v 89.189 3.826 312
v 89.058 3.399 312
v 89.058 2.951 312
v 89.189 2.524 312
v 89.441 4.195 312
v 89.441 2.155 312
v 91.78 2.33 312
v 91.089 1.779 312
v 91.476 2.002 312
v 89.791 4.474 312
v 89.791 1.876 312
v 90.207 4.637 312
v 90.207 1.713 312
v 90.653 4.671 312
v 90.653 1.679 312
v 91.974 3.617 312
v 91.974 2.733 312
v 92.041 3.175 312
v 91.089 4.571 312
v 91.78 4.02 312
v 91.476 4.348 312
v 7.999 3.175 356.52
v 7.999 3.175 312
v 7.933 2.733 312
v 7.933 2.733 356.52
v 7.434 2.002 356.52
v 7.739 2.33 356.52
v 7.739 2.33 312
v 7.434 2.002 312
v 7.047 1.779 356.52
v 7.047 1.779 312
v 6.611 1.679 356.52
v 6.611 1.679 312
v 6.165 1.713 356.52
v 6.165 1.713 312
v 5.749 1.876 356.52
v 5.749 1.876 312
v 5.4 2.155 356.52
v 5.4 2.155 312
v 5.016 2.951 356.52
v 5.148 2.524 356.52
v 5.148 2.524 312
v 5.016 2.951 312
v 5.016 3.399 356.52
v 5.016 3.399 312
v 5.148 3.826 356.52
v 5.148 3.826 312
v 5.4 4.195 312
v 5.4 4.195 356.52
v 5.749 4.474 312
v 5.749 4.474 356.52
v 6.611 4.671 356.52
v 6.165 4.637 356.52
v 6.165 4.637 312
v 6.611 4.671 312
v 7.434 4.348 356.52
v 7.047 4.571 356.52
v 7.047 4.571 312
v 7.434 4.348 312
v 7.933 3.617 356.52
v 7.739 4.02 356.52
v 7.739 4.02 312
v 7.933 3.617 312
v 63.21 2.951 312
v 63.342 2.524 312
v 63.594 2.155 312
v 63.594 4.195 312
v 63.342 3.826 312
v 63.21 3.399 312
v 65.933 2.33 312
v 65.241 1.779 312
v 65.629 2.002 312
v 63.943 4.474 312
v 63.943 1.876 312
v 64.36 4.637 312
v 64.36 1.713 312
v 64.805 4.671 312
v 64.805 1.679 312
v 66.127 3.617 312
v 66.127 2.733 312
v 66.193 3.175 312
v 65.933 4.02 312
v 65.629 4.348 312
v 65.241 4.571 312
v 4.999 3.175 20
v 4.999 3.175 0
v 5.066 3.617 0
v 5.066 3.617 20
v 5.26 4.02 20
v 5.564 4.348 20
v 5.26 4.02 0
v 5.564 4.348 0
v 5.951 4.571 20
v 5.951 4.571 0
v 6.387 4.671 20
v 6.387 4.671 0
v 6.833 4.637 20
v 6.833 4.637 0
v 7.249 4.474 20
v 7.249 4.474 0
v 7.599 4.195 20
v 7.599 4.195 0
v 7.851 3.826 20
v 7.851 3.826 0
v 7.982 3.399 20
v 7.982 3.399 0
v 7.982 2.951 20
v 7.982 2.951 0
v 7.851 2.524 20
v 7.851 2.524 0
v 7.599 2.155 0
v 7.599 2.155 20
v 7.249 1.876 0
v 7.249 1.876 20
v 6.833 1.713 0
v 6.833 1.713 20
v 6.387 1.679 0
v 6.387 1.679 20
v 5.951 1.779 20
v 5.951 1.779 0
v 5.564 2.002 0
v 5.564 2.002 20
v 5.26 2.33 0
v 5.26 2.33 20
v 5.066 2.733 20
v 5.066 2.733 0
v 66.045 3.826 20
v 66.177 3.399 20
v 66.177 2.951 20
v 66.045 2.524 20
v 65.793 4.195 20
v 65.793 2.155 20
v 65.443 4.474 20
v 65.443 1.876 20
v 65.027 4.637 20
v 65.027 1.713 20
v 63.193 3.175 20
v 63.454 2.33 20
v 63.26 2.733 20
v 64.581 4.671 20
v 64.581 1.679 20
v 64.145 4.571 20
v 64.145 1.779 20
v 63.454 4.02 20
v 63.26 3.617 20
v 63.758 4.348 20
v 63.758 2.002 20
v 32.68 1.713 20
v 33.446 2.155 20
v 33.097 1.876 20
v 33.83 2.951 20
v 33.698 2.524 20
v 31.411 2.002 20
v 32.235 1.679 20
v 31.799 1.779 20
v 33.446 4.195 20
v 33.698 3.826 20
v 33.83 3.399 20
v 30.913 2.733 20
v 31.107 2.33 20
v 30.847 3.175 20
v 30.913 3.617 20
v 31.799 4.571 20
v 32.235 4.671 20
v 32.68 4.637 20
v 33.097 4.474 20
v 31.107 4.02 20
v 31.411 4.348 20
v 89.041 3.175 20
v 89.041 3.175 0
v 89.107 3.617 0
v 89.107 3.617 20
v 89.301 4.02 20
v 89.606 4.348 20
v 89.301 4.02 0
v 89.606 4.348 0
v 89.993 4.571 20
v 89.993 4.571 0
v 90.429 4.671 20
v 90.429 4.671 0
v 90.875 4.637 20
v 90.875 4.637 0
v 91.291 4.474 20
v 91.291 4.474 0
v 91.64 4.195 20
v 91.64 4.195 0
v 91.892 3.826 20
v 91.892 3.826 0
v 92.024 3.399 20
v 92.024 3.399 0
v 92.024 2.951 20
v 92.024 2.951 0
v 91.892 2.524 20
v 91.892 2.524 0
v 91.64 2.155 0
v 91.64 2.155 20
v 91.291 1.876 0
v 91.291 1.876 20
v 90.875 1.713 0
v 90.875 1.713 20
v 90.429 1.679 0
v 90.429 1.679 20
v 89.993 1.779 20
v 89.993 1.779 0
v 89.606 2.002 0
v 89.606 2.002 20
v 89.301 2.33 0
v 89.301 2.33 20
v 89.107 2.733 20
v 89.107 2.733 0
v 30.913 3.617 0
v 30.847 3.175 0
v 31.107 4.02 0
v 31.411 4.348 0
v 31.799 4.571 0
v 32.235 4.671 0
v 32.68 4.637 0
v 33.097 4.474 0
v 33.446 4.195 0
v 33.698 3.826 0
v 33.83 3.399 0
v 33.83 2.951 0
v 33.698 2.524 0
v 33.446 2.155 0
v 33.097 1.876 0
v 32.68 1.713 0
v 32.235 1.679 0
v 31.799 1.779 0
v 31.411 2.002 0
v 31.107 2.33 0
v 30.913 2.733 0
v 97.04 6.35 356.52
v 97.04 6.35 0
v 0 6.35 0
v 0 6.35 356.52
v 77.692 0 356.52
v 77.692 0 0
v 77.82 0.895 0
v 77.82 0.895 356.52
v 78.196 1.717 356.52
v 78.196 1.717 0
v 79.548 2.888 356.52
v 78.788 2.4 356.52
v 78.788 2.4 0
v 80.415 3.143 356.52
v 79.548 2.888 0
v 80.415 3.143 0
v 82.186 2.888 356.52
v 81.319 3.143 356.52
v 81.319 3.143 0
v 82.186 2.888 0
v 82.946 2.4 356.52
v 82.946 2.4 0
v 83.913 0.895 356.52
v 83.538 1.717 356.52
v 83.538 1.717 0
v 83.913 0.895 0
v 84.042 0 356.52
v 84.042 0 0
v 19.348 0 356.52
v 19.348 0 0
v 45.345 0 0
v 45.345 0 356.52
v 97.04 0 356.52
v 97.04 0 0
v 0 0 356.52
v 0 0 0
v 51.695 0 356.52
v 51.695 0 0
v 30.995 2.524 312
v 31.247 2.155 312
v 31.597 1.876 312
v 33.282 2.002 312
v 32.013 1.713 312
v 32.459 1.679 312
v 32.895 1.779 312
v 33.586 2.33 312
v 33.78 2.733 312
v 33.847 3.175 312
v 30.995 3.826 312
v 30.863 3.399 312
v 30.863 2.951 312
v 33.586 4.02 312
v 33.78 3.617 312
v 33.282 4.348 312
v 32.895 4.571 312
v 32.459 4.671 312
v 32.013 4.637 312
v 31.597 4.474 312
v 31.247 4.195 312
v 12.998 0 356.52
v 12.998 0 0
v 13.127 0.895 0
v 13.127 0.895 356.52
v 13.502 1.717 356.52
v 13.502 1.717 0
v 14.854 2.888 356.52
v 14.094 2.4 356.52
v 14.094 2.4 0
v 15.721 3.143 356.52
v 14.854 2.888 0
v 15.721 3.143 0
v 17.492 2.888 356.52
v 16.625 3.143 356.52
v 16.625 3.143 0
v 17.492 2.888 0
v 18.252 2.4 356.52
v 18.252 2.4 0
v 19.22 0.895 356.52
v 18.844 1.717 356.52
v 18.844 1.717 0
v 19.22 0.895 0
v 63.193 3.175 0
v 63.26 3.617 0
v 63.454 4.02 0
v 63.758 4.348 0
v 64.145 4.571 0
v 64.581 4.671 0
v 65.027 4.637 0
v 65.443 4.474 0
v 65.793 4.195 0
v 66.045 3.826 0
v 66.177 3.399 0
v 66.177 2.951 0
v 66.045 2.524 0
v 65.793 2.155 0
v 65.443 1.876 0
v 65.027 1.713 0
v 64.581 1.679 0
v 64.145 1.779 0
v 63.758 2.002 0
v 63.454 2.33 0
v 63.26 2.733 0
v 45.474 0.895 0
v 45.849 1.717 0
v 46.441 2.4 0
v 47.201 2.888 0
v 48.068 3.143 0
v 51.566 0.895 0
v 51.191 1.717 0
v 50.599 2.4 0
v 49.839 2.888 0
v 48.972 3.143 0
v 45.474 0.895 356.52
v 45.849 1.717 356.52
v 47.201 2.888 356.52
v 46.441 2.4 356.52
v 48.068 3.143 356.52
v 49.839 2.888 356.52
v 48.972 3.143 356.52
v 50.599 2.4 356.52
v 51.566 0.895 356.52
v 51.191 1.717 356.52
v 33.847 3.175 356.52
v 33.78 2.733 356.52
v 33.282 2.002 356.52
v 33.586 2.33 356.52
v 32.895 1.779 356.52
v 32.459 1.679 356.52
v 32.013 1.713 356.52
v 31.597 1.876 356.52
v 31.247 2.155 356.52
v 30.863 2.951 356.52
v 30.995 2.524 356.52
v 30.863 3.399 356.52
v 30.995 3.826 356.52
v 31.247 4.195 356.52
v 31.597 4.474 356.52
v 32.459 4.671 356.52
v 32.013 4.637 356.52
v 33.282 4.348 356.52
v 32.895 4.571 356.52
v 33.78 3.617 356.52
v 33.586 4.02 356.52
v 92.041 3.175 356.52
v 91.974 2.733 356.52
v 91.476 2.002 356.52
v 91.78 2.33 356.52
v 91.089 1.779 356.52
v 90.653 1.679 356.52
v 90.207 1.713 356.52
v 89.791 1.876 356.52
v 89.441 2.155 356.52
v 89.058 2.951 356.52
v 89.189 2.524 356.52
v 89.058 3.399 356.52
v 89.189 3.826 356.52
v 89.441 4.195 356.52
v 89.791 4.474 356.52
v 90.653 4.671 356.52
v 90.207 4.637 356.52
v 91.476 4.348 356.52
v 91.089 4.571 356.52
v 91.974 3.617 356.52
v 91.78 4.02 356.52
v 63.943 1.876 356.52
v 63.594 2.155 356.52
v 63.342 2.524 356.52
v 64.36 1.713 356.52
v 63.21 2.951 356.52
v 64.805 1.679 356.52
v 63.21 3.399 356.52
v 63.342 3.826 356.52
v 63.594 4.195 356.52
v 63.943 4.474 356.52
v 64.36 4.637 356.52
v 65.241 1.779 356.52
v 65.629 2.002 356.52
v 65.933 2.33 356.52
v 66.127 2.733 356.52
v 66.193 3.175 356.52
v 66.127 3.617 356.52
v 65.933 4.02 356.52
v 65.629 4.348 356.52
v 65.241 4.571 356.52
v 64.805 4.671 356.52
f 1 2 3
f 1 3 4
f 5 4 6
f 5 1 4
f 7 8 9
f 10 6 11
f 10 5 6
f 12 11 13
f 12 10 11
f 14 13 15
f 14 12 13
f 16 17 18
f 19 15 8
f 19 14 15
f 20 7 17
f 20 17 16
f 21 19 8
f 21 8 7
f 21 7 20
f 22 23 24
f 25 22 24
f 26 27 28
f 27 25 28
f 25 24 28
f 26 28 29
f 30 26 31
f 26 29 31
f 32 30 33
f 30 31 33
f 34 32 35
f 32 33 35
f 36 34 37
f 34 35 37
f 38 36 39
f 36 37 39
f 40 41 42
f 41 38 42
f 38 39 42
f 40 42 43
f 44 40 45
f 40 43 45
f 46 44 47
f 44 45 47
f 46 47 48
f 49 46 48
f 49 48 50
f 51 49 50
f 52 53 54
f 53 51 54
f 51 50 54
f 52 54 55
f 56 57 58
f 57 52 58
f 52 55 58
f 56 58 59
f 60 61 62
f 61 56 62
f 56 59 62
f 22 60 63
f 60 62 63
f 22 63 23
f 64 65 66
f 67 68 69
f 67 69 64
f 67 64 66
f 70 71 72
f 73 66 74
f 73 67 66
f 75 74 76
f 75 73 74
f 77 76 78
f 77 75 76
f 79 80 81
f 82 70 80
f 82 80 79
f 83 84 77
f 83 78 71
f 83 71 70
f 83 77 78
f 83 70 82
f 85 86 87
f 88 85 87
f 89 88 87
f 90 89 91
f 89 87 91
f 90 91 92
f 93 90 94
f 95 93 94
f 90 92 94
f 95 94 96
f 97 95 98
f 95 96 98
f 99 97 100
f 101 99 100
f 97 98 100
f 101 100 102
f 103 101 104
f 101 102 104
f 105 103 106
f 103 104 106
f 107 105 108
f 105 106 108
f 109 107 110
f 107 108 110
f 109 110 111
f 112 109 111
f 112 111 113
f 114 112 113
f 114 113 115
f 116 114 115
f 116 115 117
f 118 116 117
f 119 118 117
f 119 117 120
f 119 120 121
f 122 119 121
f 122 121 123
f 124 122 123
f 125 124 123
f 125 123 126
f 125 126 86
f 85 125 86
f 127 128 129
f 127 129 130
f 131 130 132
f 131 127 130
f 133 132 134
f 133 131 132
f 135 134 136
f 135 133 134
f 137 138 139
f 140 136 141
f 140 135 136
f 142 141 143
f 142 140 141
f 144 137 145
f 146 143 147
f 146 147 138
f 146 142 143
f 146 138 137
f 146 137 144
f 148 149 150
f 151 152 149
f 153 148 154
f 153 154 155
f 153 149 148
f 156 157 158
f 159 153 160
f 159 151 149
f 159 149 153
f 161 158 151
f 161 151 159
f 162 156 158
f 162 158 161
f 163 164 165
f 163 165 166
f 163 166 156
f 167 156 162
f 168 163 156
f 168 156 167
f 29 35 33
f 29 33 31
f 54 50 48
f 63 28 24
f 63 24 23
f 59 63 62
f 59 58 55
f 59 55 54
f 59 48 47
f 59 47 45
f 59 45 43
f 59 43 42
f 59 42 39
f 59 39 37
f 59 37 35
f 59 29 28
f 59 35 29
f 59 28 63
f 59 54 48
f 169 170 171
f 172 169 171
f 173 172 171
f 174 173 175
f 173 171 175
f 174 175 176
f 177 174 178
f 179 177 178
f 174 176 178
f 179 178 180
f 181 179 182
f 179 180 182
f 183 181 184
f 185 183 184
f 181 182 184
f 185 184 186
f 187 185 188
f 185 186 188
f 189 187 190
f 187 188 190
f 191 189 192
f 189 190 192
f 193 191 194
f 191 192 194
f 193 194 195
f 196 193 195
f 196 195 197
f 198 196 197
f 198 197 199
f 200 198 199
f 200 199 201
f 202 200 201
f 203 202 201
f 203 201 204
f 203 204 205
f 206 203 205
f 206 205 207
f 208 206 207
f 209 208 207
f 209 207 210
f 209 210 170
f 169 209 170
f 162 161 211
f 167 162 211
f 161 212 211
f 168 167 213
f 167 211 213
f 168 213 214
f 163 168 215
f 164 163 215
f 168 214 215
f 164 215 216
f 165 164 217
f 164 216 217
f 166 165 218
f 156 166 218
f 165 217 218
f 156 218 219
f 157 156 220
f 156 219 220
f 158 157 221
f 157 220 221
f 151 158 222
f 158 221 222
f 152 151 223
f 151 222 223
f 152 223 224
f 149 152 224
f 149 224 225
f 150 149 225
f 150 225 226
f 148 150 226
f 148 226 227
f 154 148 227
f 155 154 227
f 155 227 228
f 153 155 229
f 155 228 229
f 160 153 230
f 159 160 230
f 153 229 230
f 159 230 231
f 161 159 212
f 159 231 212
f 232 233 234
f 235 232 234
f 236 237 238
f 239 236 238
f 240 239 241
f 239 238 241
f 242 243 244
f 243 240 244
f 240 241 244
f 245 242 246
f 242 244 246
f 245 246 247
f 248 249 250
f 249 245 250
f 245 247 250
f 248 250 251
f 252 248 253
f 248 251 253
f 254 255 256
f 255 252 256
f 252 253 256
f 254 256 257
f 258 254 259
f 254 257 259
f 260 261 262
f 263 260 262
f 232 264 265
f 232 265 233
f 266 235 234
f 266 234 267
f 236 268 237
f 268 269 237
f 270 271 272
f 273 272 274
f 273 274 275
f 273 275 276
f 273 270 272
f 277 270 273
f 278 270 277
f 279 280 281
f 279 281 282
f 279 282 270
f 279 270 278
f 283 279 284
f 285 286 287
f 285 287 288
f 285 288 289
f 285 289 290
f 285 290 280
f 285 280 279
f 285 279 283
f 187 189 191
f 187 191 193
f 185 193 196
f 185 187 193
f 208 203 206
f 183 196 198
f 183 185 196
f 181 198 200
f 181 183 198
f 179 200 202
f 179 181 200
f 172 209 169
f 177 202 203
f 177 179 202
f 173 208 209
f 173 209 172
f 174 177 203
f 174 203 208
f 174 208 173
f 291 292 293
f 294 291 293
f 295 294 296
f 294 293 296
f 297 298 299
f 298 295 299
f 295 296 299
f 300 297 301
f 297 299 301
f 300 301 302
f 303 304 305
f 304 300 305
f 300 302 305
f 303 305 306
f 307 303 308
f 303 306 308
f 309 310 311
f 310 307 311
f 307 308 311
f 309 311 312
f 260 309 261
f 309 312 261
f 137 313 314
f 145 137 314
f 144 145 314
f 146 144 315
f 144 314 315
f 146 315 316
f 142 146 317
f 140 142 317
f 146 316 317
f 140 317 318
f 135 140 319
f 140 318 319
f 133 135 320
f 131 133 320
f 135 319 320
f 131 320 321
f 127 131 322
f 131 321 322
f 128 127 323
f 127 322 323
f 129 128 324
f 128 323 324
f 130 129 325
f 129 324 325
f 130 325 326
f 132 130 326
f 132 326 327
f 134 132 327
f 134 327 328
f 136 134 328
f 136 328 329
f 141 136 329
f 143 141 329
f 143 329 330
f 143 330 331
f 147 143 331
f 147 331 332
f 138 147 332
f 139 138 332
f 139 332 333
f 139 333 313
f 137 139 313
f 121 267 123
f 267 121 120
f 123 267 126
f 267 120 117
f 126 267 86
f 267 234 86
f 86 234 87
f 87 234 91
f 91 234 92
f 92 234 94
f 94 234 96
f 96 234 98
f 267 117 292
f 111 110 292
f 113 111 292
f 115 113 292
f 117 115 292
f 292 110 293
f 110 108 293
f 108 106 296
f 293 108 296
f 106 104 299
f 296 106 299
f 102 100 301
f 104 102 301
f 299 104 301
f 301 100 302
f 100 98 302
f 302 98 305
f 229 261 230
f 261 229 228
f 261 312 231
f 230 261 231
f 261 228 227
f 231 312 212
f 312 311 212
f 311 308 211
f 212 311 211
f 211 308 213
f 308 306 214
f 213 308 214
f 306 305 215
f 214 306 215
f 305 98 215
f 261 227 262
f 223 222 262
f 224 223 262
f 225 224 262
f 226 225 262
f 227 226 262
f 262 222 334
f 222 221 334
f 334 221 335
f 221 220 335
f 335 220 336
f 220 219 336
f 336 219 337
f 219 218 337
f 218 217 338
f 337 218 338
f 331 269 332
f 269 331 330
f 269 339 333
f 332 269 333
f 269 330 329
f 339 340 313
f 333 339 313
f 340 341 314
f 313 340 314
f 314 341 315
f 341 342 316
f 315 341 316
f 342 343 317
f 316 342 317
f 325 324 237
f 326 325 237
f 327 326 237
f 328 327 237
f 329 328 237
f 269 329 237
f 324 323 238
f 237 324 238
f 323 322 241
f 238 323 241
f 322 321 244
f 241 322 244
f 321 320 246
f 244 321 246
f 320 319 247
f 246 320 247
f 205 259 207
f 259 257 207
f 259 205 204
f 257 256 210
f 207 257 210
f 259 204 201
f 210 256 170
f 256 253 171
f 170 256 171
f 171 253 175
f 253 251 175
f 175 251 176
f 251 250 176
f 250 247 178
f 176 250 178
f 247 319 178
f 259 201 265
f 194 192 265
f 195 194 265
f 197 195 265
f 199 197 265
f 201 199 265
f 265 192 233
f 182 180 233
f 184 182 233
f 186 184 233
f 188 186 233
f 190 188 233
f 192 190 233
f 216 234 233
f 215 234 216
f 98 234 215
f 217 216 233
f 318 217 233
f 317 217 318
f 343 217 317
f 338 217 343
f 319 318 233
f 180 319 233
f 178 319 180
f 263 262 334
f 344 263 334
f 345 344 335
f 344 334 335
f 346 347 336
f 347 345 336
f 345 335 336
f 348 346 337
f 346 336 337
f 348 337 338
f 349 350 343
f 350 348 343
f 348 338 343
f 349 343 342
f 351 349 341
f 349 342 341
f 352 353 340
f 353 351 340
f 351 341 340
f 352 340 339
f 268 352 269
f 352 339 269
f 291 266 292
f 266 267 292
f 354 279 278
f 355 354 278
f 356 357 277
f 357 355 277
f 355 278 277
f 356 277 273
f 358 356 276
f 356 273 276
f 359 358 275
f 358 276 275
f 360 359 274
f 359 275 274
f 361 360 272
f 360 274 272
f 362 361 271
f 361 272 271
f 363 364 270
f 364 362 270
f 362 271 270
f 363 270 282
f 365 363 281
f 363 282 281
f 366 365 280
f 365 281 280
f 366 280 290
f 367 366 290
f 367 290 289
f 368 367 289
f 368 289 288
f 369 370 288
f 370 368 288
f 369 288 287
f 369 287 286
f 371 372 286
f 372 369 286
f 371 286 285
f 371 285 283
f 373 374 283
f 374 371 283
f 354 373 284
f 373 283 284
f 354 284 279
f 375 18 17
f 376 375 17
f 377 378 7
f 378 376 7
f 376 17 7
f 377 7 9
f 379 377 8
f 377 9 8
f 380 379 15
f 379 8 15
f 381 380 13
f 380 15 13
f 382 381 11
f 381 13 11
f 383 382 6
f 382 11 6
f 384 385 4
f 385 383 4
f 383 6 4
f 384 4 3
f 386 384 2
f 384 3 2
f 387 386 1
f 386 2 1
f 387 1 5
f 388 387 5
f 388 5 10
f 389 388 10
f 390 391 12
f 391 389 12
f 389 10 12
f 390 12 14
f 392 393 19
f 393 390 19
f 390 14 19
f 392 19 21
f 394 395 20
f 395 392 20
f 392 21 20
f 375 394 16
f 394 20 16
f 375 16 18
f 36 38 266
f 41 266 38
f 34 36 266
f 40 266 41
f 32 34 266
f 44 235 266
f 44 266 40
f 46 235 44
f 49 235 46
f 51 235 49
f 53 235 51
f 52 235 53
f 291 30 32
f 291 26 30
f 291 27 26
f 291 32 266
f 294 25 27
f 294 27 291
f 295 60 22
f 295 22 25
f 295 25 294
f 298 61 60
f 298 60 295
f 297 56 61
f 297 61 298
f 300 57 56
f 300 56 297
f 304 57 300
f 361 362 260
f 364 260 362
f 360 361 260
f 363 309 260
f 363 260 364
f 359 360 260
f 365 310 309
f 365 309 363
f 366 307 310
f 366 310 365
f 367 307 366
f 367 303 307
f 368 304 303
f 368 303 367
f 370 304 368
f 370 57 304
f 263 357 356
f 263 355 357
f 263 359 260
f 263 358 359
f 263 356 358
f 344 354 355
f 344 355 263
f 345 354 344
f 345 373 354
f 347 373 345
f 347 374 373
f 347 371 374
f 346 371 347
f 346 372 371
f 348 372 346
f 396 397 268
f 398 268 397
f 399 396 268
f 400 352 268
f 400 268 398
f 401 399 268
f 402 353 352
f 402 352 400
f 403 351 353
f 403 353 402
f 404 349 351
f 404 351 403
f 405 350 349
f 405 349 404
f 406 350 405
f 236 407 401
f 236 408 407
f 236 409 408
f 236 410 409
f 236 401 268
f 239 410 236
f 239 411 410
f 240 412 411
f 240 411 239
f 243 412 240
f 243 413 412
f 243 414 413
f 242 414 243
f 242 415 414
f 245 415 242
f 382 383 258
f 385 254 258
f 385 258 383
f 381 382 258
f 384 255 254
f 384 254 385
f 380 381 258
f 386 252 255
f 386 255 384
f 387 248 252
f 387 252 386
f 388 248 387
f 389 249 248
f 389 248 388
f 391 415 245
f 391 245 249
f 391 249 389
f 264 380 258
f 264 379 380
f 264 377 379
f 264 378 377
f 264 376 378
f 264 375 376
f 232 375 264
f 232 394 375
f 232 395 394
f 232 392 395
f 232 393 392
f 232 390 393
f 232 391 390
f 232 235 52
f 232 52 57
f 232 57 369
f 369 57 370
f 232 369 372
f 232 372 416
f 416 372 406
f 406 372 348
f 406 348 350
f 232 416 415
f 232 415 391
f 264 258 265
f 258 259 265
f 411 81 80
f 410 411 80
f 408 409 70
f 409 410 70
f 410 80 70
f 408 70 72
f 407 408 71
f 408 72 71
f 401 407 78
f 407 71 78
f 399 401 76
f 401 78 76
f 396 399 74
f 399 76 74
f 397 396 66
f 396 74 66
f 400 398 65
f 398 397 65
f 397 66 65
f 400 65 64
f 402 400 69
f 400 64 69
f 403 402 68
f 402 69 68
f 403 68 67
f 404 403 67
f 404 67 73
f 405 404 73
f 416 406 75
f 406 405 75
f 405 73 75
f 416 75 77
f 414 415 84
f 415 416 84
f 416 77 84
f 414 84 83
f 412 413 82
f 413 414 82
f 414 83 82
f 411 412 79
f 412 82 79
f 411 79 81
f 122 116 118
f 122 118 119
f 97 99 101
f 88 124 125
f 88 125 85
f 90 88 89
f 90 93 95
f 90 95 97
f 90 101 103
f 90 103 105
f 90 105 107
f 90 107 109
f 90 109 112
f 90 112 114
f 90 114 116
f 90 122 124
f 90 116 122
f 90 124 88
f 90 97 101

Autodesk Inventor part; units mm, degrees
ref_plane "YZ Plane" through (0, 0, 0) normal (1, 0, 0) x (0, 1, 0)
ref_plane "XZ Plane" through (0, 0, 0) normal (0, 1, 0) x (-1, 0, 0)
ref_plane "XY Plane" through (0, 0, 0) normal (0, 0, 1) x (1, 0, 0)
sketch "Sketch1" plane through (0, 0, 0) normal (0, 0, 1) x (1, 0, 0)
  line L0 (0, 0) -> (0, 6.35)
  line L1 (0, 6.35) -> (97.04, 6.35)
  line L2 (97.04, 6.35) -> (97.04, 0)
  line L3 (97.04, 0) -> (0, 0)
  dimension "d0" = 6.35
  dimension "d1" = 97.04
extrude "Extrusion1" add sketch "Sketch1" along normal blind 332
sketch "Sketch2" plane through (0, 0, 332) normal (0, 0, 1) x (1, 0, 0)
  line L0 (0, 0) -> (16.1733, 0) construction
  line L1 (16.1733, 0) -> (48.52, 0) construction
  line L2 (48.52, 0) -> (80.8667, 0) construction
  line L3 (0, 0) -> (97.04, 0) projected
  arc A0 (19.3483, 0) -> (12.9983, 0) centre (16.1733, 0) ccw
  arc A1 (51.695, 0) -> (45.345, 0) centre (48.52, 0) ccw
  arc A2 (84.0417, 0) -> (77.6917, 0) centre (80.8667, 0) ccw
  line L4 (12.9983, 0) -> (19.3483, 0)
  line L5 (45.345, 0) -> (51.695, 0)
  line L6 (77.6917, 0) -> (84.0417, 0)
  dimension "d4" = 16.1733
  dimension "d5" = 32.3467
  dimension "d6" = 32.3467
  dimension "d12" = 3.175
  dimension "d13" = 3.175
  dimension "d14" = 3.175
extrude "Extrusion3" cut sketch "Sketch2" against normal through all
sketch "Sketch3" plane through (0, 0, 332) normal (0, 0, 1) x (1, 0, 0)
  arc A0 (19.3483, 0) -> (12.9983, 0) centre (16.1733, 0) ccw projected
  line L0 (0, 0) -> (0, 6.35) construction
  line L1 (0, 0) -> (0, 3.175) construction
  arc A1 (19.3483, 0) -> (12.9983, 0) centre (16.1733, 0) ccw construction
  line L2 (16.1733, 3.175) -> (12.9983, 3.175)
  line L3 (0, 3.175) -> (6.4992, 3.175) construction
  line L4 (45.345, 0) -> (19.3483, 0) construction
  line L5 (19.3483, 0) -> (32.3467, 0) construction
  circle A2 centre (32.3467, 3.175) radius 1.5
  circle A3 centre (6.4992, 3.175) radius 1.5
  line L6 (51.695, 0) -> (64.6933, 0) construction
  line L7 (77.6917, 0) -> (51.695, 0) construction
  circle A4 centre (64.6933, 3.175) radius 1.5
  line L8 (84.0417, 0) -> (90.5408, 0) construction
  line L9 (97.04, 0) -> (84.0417, 0) construction
  circle A5 centre (90.5408, 3.175) radius 1.5
  dimension "d17" = 3
  dimension "d18" = 3
  dimension "d19" = 3
  dimension "d20" = 3
extrude "Extrusion4" cut sketch "Sketch3" against normal blind 20
sketch "Sketch4" plane through (0, 0, 0) normal (0, 0, -1) x (-1, 0, 0)
  circle A0 centre (-6.4992, 3.175) radius 1.5
  circle A1 centre (-32.3467, 3.175) radius 1.5
  circle A2 centre (-64.6933, 3.175) radius 1.5
  circle A3 centre (-90.5408, 3.175) radius 1.5
  dimension "d23" = 3
  dimension "d24" = 3
  dimension "d25" = 3
  dimension "d26" = 3
extrude "Extrusion5" cut sketch "Sketch4" against normal blind 20
sketch "Sketch5" plane through (0, 0, 332) normal (0, 0, 1) x (1, 0, 0)
  circle A0 centre (64.6933, 3.175) radius 1.5 projected
  circle A1 centre (32.3467, 3.175) radius 1.5 projected
  circle A2 centre (6.4992, 3.175) radius 1.5 projected
  circle A3 centre (90.5408, 3.175) radius 1.5 projected
  arc A4 (51.695, 0) -> (45.345, 0) centre (48.52, 0) ccw projected
  line L0 (51.695, 0) -> (77.6917, 0) projected
  arc A5 (84.0417, 0) -> (77.6917, 0) centre (80.8667, 0) ccw projected
  line L1 (84.0417, 0) -> (97.04, 0) projected
  line L2 (97.04, 0) -> (97.04, 6.35) projected
  line L3 (97.04, 6.35) -> (0, 6.35) projected
  line L4 (0, 6.35) -> (0, 0) projected
  line L5 (0, 0) -> (12.9983, 0) projected
  arc A6 (19.3483, 0) -> (12.9983, 0) centre (16.1733, 0) ccw projected
  line L6 (19.3483, 0) -> (45.345, 0) projected
extrude "Extrusion6" add sketch "Sketch5" along normal blind 30.87
sketch "Sketch6" plane through (0, 0, 362.87) normal (0, 0, 1) x (1, 0, 0)
  circle A0 centre (90.5408, 3.175) radius 1.5 projected
  circle A1 centre (6.4992, 3.175) radius 1.5 projected
  circle A2 centre (32.3467, 3.175) radius 1.5 projected
  circle A3 centre (64.6933, 3.175) radius 1.5 projected
  arc A4 (51.695, 0) -> (45.345, 0) centre (48.52, 0) ccw projected
  line L0 (51.695, 0) -> (77.6917, 0) projected
  arc A5 (84.0417, 0) -> (77.6917, 0) centre (80.8667, 0) ccw projected
  line L1 (84.0417, 0) -> (97.04, 0) projected
  line L2 (97.04, 0) -> (97.04, 6.35) projected
  line L3 (97.04, 6.35) -> (0, 6.35) projected
  line L4 (0, 6.35) -> (0, 0) projected
  line L5 (0, 0) -> (12.9983, 0) projected
  arc A6 (19.3483, 0) -> (12.9983, 0) centre (16.1733, 0) ccw projected
  line L6 (19.3483, 0) -> (45.345, 0) projected
extrude "Extrusion7" cut sketch "Sketch6" against normal blind 6.35
properties part number "coverplate"
